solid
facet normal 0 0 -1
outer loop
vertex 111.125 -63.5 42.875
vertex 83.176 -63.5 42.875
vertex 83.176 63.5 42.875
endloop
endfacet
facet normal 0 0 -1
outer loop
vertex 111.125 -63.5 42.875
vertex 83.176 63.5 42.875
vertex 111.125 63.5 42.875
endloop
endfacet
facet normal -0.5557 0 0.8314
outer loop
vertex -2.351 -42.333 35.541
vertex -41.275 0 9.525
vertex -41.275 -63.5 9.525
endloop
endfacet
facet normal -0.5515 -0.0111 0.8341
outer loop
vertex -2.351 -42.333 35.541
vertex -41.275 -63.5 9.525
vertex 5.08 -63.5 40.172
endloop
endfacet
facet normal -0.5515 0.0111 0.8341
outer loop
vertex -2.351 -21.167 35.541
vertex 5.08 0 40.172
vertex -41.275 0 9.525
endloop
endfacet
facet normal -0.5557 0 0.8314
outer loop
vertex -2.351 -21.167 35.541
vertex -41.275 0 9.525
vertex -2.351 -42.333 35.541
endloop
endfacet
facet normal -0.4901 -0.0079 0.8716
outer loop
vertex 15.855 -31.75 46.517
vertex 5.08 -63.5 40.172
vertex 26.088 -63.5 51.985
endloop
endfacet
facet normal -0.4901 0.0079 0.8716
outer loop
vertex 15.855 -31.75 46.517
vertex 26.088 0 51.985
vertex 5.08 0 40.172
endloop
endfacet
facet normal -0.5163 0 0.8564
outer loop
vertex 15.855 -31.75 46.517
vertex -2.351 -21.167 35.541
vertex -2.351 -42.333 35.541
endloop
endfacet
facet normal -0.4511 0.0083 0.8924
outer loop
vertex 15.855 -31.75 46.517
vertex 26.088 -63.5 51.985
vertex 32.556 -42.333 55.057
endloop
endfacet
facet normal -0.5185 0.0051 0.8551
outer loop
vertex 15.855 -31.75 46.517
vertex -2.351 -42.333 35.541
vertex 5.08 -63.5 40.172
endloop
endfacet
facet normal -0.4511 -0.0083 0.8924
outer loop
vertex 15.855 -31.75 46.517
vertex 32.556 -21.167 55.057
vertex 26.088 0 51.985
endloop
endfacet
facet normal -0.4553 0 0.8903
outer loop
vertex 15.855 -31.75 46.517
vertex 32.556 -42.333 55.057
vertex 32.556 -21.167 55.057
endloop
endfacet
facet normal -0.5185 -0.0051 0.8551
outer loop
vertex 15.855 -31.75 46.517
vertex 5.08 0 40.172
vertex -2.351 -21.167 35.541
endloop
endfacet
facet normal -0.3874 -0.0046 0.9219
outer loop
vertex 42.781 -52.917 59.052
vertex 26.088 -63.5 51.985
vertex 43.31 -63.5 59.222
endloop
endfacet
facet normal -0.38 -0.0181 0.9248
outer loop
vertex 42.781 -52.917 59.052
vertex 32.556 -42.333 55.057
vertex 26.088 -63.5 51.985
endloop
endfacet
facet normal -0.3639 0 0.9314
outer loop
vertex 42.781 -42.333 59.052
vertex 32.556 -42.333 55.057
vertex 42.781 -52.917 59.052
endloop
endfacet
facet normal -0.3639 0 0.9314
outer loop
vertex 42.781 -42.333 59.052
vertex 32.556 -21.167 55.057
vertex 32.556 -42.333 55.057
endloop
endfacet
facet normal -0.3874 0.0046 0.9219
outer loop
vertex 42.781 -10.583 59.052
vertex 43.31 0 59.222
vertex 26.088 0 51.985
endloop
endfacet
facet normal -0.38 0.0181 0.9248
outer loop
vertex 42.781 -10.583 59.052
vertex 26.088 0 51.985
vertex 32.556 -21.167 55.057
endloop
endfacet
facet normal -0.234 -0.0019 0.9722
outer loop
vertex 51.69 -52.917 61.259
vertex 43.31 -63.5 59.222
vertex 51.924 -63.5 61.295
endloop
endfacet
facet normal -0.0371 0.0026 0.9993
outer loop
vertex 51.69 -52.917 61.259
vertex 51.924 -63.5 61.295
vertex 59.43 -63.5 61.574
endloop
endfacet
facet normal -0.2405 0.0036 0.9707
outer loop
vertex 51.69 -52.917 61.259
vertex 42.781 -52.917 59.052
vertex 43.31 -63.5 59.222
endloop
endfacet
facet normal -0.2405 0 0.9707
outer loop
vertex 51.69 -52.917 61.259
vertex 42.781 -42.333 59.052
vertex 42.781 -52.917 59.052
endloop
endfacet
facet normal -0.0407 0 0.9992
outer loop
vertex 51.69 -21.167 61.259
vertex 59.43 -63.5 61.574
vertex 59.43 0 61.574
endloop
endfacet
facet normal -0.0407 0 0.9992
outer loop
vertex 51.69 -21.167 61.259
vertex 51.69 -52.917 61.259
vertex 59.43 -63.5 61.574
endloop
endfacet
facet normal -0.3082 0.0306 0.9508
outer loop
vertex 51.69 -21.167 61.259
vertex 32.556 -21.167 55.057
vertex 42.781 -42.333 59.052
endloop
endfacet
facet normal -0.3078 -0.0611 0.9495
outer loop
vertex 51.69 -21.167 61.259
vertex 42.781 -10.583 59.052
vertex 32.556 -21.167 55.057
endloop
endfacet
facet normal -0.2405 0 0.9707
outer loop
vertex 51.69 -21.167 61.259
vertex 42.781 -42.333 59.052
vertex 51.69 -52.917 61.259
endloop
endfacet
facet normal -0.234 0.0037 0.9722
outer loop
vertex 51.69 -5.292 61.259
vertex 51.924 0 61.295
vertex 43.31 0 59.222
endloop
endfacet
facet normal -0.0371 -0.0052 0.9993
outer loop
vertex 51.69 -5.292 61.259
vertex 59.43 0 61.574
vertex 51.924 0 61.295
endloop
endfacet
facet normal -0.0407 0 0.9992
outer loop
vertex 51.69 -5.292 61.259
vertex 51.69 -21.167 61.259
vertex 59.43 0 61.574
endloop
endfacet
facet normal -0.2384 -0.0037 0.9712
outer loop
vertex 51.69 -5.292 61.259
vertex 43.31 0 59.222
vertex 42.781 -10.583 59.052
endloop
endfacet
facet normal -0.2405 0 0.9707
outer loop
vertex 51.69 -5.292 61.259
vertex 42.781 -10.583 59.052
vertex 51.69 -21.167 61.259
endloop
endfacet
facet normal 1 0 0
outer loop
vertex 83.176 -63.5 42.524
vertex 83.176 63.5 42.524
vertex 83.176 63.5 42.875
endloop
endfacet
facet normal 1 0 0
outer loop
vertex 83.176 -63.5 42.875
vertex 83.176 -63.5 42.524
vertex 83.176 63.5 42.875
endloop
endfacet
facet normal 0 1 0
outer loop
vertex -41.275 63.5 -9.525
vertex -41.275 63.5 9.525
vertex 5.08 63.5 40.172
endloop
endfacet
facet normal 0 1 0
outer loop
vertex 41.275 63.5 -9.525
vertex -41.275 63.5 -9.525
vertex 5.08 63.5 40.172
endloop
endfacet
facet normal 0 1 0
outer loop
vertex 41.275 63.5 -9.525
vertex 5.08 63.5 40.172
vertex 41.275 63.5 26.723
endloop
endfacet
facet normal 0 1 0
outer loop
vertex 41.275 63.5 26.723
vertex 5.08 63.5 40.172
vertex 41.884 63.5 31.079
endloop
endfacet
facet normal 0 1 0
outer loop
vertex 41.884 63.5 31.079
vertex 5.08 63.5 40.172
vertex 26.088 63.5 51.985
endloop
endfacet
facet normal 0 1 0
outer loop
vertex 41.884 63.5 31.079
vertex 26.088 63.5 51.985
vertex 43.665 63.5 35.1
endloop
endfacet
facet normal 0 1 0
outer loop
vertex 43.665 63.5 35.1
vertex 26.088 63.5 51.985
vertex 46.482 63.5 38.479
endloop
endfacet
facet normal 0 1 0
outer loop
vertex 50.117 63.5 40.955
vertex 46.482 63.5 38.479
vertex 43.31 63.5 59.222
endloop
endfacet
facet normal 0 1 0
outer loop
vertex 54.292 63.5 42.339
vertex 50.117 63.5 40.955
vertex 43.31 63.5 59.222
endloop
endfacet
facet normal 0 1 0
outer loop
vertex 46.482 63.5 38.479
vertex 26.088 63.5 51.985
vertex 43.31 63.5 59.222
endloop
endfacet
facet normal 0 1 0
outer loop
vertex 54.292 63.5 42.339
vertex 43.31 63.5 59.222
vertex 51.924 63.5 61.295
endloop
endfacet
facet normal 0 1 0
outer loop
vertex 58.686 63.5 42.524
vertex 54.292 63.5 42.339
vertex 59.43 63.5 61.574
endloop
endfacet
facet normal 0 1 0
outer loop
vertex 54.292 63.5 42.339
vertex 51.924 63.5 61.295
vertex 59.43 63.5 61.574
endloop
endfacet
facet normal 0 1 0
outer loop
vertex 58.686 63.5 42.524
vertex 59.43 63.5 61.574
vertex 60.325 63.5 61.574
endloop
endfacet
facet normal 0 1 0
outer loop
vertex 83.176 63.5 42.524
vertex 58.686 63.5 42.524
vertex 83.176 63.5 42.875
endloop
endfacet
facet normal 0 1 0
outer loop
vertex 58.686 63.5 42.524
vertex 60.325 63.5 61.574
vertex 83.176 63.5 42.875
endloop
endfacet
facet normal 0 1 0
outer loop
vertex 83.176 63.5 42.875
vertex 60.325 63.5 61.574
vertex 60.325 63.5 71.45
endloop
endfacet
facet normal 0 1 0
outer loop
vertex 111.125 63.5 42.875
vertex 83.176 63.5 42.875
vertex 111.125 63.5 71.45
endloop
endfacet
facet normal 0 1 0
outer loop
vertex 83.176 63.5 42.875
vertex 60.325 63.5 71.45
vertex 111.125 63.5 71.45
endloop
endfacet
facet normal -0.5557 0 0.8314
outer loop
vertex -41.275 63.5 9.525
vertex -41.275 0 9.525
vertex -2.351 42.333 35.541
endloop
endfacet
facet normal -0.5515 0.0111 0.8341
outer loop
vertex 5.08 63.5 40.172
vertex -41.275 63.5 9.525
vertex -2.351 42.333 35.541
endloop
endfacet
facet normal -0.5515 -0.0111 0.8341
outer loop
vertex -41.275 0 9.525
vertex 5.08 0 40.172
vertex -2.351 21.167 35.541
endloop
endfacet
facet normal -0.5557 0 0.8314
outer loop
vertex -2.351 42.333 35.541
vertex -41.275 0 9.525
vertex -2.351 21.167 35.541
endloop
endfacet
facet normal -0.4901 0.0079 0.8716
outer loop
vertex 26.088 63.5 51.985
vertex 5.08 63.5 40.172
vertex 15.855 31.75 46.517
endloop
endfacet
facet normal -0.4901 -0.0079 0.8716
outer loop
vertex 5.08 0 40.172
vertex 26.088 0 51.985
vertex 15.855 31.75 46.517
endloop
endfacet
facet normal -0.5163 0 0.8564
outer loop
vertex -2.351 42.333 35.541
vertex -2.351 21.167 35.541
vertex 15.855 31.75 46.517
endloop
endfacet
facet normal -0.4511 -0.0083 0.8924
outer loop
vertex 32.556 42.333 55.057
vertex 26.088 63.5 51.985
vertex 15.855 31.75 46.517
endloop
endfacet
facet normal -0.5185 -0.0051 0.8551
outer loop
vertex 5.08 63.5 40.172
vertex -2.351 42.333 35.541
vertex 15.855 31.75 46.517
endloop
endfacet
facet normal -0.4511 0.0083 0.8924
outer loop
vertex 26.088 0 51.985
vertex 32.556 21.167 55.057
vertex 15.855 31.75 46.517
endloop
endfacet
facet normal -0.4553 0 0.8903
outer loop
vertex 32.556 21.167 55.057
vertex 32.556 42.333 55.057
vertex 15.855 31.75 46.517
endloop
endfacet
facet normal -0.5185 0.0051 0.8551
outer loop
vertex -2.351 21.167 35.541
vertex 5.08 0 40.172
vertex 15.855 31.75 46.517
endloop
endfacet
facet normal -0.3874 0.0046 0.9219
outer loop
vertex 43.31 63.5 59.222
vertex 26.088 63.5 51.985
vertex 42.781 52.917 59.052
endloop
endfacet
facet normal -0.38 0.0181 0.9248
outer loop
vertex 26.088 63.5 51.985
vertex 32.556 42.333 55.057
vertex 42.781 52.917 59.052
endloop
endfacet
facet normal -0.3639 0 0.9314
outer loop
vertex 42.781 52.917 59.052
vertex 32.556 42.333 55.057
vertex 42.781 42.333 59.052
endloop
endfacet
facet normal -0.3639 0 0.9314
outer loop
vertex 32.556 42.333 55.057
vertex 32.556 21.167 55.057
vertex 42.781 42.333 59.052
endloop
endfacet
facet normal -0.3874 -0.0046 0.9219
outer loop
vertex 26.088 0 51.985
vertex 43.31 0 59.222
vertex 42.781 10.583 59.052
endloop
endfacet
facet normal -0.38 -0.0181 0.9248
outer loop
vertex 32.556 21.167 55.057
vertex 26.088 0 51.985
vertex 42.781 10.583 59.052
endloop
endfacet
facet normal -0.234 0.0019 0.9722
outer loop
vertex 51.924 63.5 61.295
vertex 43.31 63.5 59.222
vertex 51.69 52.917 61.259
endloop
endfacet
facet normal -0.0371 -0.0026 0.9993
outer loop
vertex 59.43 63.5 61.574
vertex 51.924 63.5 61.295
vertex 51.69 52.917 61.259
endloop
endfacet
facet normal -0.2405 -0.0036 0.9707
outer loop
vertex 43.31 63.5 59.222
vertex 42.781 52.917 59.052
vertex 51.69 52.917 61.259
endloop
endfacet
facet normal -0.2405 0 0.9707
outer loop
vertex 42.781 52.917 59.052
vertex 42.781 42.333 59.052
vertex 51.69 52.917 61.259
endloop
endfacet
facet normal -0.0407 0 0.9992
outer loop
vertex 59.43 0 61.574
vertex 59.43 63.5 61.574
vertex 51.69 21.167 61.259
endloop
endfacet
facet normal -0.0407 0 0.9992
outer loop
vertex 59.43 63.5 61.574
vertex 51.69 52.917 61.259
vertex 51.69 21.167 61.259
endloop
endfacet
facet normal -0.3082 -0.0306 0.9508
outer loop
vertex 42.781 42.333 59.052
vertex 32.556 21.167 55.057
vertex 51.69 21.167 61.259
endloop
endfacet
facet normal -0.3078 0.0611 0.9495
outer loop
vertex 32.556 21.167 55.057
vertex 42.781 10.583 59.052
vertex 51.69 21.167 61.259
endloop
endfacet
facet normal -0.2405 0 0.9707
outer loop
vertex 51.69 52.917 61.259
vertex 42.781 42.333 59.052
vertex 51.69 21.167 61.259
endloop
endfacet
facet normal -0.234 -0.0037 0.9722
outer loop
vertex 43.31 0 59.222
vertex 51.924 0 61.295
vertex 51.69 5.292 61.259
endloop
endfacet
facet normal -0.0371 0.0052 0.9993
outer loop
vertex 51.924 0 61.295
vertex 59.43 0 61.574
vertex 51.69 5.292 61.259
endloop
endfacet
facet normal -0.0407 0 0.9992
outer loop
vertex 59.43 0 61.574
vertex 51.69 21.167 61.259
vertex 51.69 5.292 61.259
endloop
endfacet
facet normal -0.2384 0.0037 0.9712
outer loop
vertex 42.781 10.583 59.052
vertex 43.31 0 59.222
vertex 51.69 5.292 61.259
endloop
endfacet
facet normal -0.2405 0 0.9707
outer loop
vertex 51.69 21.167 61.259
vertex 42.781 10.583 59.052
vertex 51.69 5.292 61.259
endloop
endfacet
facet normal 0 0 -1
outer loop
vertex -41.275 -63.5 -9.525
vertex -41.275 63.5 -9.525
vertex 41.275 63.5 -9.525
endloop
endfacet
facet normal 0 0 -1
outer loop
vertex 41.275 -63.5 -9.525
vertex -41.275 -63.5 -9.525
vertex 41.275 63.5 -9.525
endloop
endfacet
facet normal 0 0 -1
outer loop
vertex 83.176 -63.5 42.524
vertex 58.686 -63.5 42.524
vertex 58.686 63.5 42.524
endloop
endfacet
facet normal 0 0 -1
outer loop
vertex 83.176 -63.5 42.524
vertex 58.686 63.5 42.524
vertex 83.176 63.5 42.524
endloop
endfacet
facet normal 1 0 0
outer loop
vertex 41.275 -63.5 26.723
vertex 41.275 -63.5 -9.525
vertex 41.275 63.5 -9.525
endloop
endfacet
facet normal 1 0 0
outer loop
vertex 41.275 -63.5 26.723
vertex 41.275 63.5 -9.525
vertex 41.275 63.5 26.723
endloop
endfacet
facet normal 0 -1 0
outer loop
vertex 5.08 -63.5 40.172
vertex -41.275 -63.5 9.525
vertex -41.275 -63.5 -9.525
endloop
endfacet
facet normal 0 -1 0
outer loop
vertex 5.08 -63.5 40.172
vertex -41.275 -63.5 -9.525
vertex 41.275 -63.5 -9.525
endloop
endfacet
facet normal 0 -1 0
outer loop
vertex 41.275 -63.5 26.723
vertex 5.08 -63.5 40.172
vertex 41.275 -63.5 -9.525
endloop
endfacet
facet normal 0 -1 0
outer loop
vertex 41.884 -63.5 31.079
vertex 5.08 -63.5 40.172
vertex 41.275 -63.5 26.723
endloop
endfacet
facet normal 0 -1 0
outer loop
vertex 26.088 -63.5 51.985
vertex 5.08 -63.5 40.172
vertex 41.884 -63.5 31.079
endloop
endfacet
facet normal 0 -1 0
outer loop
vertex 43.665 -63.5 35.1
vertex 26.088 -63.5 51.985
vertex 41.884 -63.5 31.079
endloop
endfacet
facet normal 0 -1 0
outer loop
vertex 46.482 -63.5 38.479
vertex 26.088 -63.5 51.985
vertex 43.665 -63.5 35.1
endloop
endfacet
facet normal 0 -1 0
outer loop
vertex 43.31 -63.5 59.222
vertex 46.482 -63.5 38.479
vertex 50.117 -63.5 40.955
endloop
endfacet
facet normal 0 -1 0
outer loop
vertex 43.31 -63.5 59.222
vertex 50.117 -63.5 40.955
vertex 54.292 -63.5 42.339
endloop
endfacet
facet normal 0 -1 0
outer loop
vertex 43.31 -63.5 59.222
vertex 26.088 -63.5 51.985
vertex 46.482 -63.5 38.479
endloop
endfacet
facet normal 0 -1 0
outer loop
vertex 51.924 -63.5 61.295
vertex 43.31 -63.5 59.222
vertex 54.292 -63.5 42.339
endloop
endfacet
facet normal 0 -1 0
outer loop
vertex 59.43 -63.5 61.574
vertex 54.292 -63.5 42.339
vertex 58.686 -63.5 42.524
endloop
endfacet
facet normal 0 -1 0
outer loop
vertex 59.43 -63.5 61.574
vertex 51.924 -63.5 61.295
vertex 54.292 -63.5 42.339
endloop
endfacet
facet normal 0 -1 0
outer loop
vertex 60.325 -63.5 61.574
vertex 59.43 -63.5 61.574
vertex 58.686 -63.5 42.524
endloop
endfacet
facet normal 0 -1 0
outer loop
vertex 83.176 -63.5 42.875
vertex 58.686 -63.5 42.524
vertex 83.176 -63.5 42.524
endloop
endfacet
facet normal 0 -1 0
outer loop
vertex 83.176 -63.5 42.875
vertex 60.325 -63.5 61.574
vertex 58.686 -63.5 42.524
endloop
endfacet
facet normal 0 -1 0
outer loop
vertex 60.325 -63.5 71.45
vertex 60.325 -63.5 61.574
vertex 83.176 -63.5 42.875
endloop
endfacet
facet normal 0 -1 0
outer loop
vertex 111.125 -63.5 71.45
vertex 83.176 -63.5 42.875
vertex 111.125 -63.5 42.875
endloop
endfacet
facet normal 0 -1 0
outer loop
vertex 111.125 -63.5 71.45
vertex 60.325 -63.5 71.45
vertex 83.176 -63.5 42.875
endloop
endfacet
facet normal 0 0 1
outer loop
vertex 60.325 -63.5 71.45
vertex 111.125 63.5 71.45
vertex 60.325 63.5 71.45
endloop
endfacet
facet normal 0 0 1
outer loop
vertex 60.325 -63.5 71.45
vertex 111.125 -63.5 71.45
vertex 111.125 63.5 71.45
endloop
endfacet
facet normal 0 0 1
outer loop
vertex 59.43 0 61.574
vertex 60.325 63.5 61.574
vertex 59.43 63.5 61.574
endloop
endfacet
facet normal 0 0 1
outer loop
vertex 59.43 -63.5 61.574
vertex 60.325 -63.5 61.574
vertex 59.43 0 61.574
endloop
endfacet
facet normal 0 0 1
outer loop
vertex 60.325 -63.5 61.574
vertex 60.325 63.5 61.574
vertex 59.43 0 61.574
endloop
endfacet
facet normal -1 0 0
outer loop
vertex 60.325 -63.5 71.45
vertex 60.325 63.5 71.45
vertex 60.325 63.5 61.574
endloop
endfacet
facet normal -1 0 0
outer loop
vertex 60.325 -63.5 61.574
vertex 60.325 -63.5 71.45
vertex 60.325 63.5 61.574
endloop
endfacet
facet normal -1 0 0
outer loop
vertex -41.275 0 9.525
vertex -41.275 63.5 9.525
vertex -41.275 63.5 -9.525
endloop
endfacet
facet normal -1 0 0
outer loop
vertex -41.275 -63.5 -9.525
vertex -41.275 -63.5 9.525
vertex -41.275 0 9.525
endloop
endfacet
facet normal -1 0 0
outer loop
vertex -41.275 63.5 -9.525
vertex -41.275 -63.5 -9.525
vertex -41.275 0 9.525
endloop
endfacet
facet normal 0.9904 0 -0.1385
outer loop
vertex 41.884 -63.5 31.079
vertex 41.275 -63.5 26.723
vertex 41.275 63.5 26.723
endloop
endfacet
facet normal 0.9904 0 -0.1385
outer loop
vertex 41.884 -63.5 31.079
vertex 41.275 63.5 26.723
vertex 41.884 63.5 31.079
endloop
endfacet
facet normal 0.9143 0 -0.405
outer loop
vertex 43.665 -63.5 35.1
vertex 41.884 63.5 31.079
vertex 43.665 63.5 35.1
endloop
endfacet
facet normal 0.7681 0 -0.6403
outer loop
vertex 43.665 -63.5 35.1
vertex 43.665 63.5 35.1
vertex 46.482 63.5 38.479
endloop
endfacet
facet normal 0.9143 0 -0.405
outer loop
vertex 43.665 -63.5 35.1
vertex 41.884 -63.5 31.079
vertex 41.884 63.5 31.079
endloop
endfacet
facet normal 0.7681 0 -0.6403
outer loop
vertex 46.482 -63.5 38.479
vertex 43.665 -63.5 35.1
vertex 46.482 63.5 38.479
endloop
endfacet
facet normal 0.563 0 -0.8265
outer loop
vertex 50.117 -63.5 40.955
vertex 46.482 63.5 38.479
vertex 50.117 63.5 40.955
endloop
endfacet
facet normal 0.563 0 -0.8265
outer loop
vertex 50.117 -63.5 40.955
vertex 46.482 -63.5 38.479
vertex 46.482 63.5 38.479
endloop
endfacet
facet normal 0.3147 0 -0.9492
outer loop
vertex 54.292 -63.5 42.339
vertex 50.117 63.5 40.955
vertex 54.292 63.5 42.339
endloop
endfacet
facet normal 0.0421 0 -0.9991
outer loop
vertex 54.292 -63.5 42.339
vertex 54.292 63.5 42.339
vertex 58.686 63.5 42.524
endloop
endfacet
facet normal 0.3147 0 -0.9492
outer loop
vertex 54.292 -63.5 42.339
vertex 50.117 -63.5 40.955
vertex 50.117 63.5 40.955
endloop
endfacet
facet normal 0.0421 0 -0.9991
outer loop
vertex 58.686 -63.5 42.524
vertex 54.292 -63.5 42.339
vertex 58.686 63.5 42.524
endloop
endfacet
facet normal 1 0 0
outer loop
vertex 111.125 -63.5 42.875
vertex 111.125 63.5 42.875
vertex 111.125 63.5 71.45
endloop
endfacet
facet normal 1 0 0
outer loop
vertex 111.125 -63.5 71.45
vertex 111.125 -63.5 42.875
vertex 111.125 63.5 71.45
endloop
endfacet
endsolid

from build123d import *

# Parameters (mm, degrees)
F1_DEPTH = 63.5


with BuildPart() as f1:
    # F0 (on Front) → F1 (new body, symmetric)
    with BuildSketch(Plane.XZ):
        Polygon((60.325, 71.4502), (60.325, 61.5735440695), (83.1756805858, 61.5735440695), (83.1756805858, 42.8752), (111.125, 42.8752), (111.125, 71.4502), align=None)
        Polygon((22.225, 9.525), (-41.275, 9.525), (-41.275, -9.525), (41.275, -9.525), (41.275, 9.525), align=None)
        with BuildLine():
            add(Edge.make_bspline(
                [(-41.275, 9.525), (-1.6819942421, 36.6237502339), (37.9110115159, 63.7225004679), (59.4295399317, 61.5735440695)],
                knots=[0, 0, 0, 0, 0.658665778, 0.658665778, 0.658665778, 0.658665778], degree=3))
            Line((-41.275, 9.525), (22.225, 9.525))
            Line((22.225, 9.525), (22.225, 26.7230157708))
            ThreePointArc((22.225, 26.7230157708), (33.2738330873, 52.2119207798), (59.4295399317, 61.5735440695))
        make_face()
        with BuildLine():
            Line((83.1756805858, 42.8752), (82.928727027, 42.8752))
            add(Edge.make_bspline(
                [(82.928727027, 42.8752), (83.0110521067, 42.7579930507), (83.0933663462, 42.6407685601), (83.1756805858, 42.5235440695)],
                knots=[0.9955383683, 0.9955383683, 0.9955383683, 0.9955383683, 1, 1, 1, 1], degree=3))
            Line((83.1756805858, 42.5235440695), (83.1756805858, 42.8752))
        make_face()
        with BuildLine():
            Line((60.325, 61.5735440695), (59.4295399317, 61.5735440695))
            add(Edge.make_bspline(
                [(59.4295399317, 61.5735440695), (59.7315548679, 61.5433832278), (60.030009415, 61.5074610458), (60.325, 61.4659335595)],
                knots=[0.658665778, 0.658665778, 0.658665778, 0.658665778, 0.6679102253, 0.6679102253, 0.6679102253, 0.6679102253], degree=3))
            Line((60.325, 61.4659335595), (60.325, 61.5735440695))
        make_face()
        with BuildLine():
            Line((83.1756805858, 61.5735440695), (60.325, 61.5735440695))
            Line((60.325, 61.5735440695), (60.325, 61.4659335595))
            add(Edge.make_bspline(
                [(60.325, 61.4659335595), (70.7796236232, 59.9941773031), (76.8834021634, 51.4819828541), (82.928727027, 42.8752)],
                knots=[0.6679102253, 0.6679102253, 0.6679102253, 0.6679102253, 0.9955383683, 0.9955383683, 0.9955383683, 0.9955383683], degree=3))
            Line((82.928727027, 42.8752), (83.1756805858, 42.8752))
            Line((83.1756805858, 42.8752), (83.1756805858, 61.5735440695))
        make_face()
        with BuildLine():
            Line((22.225, 26.7230157708), (22.225, 9.525))
            Line((22.225, 9.525), (41.275, 9.525))
            Line((41.275, 9.525), (41.275, 26.7230157708))
            ThreePointArc((41.275, 26.7230157708), (46.4815063401, 38.4788172334), (58.6858810115, 42.5235440695))
            Line((58.6858810115, 42.5235440695), (83.1756805858, 42.5235440695))
            add(Edge.make_bspline(
                [(82.928727027, 42.8752), (83.0110521067, 42.7579930507), (83.0933663462, 42.6407685601), (83.1756805858, 42.5235440695)],
                knots=[0.9955383683, 0.9955383683, 0.9955383683, 0.9955383683, 1, 1, 1, 1], degree=3))
            Line((82.928727027, 42.8752), (60.325, 42.8752))
            Line((60.325, 42.8752), (60.325, 61.4659335595))
            add(Edge.make_bspline(
                [(59.4295399317, 61.5735440695), (59.7315548679, 61.5433832278), (60.030009415, 61.5074610458), (60.325, 61.4659335595)],
                knots=[0.658665778, 0.658665778, 0.658665778, 0.658665778, 0.6679102253, 0.6679102253, 0.6679102253, 0.6679102253], degree=3))
            ThreePointArc((59.4295399317, 61.5735440695), (33.2738330873, 52.2119207798), (22.225, 26.7230157708))
        make_face()
        with BuildLine():
            add(Edge.make_bspline(
                [(60.325, 61.4659335595), (70.7796236232, 59.9941773031), (76.8834021634, 51.4819828541), (82.928727027, 42.8752)],
                knots=[0.6679102253, 0.6679102253, 0.6679102253, 0.6679102253, 0.9955383683, 0.9955383683, 0.9955383683, 0.9955383683], degree=3))
            Line((60.325, 61.4659335595), (60.325, 42.8752))
            Line((60.325, 42.8752), (82.928727027, 42.8752))
        make_face()
    extrude(amount=F1_DEPTH, both=True)


solid = f1.part
